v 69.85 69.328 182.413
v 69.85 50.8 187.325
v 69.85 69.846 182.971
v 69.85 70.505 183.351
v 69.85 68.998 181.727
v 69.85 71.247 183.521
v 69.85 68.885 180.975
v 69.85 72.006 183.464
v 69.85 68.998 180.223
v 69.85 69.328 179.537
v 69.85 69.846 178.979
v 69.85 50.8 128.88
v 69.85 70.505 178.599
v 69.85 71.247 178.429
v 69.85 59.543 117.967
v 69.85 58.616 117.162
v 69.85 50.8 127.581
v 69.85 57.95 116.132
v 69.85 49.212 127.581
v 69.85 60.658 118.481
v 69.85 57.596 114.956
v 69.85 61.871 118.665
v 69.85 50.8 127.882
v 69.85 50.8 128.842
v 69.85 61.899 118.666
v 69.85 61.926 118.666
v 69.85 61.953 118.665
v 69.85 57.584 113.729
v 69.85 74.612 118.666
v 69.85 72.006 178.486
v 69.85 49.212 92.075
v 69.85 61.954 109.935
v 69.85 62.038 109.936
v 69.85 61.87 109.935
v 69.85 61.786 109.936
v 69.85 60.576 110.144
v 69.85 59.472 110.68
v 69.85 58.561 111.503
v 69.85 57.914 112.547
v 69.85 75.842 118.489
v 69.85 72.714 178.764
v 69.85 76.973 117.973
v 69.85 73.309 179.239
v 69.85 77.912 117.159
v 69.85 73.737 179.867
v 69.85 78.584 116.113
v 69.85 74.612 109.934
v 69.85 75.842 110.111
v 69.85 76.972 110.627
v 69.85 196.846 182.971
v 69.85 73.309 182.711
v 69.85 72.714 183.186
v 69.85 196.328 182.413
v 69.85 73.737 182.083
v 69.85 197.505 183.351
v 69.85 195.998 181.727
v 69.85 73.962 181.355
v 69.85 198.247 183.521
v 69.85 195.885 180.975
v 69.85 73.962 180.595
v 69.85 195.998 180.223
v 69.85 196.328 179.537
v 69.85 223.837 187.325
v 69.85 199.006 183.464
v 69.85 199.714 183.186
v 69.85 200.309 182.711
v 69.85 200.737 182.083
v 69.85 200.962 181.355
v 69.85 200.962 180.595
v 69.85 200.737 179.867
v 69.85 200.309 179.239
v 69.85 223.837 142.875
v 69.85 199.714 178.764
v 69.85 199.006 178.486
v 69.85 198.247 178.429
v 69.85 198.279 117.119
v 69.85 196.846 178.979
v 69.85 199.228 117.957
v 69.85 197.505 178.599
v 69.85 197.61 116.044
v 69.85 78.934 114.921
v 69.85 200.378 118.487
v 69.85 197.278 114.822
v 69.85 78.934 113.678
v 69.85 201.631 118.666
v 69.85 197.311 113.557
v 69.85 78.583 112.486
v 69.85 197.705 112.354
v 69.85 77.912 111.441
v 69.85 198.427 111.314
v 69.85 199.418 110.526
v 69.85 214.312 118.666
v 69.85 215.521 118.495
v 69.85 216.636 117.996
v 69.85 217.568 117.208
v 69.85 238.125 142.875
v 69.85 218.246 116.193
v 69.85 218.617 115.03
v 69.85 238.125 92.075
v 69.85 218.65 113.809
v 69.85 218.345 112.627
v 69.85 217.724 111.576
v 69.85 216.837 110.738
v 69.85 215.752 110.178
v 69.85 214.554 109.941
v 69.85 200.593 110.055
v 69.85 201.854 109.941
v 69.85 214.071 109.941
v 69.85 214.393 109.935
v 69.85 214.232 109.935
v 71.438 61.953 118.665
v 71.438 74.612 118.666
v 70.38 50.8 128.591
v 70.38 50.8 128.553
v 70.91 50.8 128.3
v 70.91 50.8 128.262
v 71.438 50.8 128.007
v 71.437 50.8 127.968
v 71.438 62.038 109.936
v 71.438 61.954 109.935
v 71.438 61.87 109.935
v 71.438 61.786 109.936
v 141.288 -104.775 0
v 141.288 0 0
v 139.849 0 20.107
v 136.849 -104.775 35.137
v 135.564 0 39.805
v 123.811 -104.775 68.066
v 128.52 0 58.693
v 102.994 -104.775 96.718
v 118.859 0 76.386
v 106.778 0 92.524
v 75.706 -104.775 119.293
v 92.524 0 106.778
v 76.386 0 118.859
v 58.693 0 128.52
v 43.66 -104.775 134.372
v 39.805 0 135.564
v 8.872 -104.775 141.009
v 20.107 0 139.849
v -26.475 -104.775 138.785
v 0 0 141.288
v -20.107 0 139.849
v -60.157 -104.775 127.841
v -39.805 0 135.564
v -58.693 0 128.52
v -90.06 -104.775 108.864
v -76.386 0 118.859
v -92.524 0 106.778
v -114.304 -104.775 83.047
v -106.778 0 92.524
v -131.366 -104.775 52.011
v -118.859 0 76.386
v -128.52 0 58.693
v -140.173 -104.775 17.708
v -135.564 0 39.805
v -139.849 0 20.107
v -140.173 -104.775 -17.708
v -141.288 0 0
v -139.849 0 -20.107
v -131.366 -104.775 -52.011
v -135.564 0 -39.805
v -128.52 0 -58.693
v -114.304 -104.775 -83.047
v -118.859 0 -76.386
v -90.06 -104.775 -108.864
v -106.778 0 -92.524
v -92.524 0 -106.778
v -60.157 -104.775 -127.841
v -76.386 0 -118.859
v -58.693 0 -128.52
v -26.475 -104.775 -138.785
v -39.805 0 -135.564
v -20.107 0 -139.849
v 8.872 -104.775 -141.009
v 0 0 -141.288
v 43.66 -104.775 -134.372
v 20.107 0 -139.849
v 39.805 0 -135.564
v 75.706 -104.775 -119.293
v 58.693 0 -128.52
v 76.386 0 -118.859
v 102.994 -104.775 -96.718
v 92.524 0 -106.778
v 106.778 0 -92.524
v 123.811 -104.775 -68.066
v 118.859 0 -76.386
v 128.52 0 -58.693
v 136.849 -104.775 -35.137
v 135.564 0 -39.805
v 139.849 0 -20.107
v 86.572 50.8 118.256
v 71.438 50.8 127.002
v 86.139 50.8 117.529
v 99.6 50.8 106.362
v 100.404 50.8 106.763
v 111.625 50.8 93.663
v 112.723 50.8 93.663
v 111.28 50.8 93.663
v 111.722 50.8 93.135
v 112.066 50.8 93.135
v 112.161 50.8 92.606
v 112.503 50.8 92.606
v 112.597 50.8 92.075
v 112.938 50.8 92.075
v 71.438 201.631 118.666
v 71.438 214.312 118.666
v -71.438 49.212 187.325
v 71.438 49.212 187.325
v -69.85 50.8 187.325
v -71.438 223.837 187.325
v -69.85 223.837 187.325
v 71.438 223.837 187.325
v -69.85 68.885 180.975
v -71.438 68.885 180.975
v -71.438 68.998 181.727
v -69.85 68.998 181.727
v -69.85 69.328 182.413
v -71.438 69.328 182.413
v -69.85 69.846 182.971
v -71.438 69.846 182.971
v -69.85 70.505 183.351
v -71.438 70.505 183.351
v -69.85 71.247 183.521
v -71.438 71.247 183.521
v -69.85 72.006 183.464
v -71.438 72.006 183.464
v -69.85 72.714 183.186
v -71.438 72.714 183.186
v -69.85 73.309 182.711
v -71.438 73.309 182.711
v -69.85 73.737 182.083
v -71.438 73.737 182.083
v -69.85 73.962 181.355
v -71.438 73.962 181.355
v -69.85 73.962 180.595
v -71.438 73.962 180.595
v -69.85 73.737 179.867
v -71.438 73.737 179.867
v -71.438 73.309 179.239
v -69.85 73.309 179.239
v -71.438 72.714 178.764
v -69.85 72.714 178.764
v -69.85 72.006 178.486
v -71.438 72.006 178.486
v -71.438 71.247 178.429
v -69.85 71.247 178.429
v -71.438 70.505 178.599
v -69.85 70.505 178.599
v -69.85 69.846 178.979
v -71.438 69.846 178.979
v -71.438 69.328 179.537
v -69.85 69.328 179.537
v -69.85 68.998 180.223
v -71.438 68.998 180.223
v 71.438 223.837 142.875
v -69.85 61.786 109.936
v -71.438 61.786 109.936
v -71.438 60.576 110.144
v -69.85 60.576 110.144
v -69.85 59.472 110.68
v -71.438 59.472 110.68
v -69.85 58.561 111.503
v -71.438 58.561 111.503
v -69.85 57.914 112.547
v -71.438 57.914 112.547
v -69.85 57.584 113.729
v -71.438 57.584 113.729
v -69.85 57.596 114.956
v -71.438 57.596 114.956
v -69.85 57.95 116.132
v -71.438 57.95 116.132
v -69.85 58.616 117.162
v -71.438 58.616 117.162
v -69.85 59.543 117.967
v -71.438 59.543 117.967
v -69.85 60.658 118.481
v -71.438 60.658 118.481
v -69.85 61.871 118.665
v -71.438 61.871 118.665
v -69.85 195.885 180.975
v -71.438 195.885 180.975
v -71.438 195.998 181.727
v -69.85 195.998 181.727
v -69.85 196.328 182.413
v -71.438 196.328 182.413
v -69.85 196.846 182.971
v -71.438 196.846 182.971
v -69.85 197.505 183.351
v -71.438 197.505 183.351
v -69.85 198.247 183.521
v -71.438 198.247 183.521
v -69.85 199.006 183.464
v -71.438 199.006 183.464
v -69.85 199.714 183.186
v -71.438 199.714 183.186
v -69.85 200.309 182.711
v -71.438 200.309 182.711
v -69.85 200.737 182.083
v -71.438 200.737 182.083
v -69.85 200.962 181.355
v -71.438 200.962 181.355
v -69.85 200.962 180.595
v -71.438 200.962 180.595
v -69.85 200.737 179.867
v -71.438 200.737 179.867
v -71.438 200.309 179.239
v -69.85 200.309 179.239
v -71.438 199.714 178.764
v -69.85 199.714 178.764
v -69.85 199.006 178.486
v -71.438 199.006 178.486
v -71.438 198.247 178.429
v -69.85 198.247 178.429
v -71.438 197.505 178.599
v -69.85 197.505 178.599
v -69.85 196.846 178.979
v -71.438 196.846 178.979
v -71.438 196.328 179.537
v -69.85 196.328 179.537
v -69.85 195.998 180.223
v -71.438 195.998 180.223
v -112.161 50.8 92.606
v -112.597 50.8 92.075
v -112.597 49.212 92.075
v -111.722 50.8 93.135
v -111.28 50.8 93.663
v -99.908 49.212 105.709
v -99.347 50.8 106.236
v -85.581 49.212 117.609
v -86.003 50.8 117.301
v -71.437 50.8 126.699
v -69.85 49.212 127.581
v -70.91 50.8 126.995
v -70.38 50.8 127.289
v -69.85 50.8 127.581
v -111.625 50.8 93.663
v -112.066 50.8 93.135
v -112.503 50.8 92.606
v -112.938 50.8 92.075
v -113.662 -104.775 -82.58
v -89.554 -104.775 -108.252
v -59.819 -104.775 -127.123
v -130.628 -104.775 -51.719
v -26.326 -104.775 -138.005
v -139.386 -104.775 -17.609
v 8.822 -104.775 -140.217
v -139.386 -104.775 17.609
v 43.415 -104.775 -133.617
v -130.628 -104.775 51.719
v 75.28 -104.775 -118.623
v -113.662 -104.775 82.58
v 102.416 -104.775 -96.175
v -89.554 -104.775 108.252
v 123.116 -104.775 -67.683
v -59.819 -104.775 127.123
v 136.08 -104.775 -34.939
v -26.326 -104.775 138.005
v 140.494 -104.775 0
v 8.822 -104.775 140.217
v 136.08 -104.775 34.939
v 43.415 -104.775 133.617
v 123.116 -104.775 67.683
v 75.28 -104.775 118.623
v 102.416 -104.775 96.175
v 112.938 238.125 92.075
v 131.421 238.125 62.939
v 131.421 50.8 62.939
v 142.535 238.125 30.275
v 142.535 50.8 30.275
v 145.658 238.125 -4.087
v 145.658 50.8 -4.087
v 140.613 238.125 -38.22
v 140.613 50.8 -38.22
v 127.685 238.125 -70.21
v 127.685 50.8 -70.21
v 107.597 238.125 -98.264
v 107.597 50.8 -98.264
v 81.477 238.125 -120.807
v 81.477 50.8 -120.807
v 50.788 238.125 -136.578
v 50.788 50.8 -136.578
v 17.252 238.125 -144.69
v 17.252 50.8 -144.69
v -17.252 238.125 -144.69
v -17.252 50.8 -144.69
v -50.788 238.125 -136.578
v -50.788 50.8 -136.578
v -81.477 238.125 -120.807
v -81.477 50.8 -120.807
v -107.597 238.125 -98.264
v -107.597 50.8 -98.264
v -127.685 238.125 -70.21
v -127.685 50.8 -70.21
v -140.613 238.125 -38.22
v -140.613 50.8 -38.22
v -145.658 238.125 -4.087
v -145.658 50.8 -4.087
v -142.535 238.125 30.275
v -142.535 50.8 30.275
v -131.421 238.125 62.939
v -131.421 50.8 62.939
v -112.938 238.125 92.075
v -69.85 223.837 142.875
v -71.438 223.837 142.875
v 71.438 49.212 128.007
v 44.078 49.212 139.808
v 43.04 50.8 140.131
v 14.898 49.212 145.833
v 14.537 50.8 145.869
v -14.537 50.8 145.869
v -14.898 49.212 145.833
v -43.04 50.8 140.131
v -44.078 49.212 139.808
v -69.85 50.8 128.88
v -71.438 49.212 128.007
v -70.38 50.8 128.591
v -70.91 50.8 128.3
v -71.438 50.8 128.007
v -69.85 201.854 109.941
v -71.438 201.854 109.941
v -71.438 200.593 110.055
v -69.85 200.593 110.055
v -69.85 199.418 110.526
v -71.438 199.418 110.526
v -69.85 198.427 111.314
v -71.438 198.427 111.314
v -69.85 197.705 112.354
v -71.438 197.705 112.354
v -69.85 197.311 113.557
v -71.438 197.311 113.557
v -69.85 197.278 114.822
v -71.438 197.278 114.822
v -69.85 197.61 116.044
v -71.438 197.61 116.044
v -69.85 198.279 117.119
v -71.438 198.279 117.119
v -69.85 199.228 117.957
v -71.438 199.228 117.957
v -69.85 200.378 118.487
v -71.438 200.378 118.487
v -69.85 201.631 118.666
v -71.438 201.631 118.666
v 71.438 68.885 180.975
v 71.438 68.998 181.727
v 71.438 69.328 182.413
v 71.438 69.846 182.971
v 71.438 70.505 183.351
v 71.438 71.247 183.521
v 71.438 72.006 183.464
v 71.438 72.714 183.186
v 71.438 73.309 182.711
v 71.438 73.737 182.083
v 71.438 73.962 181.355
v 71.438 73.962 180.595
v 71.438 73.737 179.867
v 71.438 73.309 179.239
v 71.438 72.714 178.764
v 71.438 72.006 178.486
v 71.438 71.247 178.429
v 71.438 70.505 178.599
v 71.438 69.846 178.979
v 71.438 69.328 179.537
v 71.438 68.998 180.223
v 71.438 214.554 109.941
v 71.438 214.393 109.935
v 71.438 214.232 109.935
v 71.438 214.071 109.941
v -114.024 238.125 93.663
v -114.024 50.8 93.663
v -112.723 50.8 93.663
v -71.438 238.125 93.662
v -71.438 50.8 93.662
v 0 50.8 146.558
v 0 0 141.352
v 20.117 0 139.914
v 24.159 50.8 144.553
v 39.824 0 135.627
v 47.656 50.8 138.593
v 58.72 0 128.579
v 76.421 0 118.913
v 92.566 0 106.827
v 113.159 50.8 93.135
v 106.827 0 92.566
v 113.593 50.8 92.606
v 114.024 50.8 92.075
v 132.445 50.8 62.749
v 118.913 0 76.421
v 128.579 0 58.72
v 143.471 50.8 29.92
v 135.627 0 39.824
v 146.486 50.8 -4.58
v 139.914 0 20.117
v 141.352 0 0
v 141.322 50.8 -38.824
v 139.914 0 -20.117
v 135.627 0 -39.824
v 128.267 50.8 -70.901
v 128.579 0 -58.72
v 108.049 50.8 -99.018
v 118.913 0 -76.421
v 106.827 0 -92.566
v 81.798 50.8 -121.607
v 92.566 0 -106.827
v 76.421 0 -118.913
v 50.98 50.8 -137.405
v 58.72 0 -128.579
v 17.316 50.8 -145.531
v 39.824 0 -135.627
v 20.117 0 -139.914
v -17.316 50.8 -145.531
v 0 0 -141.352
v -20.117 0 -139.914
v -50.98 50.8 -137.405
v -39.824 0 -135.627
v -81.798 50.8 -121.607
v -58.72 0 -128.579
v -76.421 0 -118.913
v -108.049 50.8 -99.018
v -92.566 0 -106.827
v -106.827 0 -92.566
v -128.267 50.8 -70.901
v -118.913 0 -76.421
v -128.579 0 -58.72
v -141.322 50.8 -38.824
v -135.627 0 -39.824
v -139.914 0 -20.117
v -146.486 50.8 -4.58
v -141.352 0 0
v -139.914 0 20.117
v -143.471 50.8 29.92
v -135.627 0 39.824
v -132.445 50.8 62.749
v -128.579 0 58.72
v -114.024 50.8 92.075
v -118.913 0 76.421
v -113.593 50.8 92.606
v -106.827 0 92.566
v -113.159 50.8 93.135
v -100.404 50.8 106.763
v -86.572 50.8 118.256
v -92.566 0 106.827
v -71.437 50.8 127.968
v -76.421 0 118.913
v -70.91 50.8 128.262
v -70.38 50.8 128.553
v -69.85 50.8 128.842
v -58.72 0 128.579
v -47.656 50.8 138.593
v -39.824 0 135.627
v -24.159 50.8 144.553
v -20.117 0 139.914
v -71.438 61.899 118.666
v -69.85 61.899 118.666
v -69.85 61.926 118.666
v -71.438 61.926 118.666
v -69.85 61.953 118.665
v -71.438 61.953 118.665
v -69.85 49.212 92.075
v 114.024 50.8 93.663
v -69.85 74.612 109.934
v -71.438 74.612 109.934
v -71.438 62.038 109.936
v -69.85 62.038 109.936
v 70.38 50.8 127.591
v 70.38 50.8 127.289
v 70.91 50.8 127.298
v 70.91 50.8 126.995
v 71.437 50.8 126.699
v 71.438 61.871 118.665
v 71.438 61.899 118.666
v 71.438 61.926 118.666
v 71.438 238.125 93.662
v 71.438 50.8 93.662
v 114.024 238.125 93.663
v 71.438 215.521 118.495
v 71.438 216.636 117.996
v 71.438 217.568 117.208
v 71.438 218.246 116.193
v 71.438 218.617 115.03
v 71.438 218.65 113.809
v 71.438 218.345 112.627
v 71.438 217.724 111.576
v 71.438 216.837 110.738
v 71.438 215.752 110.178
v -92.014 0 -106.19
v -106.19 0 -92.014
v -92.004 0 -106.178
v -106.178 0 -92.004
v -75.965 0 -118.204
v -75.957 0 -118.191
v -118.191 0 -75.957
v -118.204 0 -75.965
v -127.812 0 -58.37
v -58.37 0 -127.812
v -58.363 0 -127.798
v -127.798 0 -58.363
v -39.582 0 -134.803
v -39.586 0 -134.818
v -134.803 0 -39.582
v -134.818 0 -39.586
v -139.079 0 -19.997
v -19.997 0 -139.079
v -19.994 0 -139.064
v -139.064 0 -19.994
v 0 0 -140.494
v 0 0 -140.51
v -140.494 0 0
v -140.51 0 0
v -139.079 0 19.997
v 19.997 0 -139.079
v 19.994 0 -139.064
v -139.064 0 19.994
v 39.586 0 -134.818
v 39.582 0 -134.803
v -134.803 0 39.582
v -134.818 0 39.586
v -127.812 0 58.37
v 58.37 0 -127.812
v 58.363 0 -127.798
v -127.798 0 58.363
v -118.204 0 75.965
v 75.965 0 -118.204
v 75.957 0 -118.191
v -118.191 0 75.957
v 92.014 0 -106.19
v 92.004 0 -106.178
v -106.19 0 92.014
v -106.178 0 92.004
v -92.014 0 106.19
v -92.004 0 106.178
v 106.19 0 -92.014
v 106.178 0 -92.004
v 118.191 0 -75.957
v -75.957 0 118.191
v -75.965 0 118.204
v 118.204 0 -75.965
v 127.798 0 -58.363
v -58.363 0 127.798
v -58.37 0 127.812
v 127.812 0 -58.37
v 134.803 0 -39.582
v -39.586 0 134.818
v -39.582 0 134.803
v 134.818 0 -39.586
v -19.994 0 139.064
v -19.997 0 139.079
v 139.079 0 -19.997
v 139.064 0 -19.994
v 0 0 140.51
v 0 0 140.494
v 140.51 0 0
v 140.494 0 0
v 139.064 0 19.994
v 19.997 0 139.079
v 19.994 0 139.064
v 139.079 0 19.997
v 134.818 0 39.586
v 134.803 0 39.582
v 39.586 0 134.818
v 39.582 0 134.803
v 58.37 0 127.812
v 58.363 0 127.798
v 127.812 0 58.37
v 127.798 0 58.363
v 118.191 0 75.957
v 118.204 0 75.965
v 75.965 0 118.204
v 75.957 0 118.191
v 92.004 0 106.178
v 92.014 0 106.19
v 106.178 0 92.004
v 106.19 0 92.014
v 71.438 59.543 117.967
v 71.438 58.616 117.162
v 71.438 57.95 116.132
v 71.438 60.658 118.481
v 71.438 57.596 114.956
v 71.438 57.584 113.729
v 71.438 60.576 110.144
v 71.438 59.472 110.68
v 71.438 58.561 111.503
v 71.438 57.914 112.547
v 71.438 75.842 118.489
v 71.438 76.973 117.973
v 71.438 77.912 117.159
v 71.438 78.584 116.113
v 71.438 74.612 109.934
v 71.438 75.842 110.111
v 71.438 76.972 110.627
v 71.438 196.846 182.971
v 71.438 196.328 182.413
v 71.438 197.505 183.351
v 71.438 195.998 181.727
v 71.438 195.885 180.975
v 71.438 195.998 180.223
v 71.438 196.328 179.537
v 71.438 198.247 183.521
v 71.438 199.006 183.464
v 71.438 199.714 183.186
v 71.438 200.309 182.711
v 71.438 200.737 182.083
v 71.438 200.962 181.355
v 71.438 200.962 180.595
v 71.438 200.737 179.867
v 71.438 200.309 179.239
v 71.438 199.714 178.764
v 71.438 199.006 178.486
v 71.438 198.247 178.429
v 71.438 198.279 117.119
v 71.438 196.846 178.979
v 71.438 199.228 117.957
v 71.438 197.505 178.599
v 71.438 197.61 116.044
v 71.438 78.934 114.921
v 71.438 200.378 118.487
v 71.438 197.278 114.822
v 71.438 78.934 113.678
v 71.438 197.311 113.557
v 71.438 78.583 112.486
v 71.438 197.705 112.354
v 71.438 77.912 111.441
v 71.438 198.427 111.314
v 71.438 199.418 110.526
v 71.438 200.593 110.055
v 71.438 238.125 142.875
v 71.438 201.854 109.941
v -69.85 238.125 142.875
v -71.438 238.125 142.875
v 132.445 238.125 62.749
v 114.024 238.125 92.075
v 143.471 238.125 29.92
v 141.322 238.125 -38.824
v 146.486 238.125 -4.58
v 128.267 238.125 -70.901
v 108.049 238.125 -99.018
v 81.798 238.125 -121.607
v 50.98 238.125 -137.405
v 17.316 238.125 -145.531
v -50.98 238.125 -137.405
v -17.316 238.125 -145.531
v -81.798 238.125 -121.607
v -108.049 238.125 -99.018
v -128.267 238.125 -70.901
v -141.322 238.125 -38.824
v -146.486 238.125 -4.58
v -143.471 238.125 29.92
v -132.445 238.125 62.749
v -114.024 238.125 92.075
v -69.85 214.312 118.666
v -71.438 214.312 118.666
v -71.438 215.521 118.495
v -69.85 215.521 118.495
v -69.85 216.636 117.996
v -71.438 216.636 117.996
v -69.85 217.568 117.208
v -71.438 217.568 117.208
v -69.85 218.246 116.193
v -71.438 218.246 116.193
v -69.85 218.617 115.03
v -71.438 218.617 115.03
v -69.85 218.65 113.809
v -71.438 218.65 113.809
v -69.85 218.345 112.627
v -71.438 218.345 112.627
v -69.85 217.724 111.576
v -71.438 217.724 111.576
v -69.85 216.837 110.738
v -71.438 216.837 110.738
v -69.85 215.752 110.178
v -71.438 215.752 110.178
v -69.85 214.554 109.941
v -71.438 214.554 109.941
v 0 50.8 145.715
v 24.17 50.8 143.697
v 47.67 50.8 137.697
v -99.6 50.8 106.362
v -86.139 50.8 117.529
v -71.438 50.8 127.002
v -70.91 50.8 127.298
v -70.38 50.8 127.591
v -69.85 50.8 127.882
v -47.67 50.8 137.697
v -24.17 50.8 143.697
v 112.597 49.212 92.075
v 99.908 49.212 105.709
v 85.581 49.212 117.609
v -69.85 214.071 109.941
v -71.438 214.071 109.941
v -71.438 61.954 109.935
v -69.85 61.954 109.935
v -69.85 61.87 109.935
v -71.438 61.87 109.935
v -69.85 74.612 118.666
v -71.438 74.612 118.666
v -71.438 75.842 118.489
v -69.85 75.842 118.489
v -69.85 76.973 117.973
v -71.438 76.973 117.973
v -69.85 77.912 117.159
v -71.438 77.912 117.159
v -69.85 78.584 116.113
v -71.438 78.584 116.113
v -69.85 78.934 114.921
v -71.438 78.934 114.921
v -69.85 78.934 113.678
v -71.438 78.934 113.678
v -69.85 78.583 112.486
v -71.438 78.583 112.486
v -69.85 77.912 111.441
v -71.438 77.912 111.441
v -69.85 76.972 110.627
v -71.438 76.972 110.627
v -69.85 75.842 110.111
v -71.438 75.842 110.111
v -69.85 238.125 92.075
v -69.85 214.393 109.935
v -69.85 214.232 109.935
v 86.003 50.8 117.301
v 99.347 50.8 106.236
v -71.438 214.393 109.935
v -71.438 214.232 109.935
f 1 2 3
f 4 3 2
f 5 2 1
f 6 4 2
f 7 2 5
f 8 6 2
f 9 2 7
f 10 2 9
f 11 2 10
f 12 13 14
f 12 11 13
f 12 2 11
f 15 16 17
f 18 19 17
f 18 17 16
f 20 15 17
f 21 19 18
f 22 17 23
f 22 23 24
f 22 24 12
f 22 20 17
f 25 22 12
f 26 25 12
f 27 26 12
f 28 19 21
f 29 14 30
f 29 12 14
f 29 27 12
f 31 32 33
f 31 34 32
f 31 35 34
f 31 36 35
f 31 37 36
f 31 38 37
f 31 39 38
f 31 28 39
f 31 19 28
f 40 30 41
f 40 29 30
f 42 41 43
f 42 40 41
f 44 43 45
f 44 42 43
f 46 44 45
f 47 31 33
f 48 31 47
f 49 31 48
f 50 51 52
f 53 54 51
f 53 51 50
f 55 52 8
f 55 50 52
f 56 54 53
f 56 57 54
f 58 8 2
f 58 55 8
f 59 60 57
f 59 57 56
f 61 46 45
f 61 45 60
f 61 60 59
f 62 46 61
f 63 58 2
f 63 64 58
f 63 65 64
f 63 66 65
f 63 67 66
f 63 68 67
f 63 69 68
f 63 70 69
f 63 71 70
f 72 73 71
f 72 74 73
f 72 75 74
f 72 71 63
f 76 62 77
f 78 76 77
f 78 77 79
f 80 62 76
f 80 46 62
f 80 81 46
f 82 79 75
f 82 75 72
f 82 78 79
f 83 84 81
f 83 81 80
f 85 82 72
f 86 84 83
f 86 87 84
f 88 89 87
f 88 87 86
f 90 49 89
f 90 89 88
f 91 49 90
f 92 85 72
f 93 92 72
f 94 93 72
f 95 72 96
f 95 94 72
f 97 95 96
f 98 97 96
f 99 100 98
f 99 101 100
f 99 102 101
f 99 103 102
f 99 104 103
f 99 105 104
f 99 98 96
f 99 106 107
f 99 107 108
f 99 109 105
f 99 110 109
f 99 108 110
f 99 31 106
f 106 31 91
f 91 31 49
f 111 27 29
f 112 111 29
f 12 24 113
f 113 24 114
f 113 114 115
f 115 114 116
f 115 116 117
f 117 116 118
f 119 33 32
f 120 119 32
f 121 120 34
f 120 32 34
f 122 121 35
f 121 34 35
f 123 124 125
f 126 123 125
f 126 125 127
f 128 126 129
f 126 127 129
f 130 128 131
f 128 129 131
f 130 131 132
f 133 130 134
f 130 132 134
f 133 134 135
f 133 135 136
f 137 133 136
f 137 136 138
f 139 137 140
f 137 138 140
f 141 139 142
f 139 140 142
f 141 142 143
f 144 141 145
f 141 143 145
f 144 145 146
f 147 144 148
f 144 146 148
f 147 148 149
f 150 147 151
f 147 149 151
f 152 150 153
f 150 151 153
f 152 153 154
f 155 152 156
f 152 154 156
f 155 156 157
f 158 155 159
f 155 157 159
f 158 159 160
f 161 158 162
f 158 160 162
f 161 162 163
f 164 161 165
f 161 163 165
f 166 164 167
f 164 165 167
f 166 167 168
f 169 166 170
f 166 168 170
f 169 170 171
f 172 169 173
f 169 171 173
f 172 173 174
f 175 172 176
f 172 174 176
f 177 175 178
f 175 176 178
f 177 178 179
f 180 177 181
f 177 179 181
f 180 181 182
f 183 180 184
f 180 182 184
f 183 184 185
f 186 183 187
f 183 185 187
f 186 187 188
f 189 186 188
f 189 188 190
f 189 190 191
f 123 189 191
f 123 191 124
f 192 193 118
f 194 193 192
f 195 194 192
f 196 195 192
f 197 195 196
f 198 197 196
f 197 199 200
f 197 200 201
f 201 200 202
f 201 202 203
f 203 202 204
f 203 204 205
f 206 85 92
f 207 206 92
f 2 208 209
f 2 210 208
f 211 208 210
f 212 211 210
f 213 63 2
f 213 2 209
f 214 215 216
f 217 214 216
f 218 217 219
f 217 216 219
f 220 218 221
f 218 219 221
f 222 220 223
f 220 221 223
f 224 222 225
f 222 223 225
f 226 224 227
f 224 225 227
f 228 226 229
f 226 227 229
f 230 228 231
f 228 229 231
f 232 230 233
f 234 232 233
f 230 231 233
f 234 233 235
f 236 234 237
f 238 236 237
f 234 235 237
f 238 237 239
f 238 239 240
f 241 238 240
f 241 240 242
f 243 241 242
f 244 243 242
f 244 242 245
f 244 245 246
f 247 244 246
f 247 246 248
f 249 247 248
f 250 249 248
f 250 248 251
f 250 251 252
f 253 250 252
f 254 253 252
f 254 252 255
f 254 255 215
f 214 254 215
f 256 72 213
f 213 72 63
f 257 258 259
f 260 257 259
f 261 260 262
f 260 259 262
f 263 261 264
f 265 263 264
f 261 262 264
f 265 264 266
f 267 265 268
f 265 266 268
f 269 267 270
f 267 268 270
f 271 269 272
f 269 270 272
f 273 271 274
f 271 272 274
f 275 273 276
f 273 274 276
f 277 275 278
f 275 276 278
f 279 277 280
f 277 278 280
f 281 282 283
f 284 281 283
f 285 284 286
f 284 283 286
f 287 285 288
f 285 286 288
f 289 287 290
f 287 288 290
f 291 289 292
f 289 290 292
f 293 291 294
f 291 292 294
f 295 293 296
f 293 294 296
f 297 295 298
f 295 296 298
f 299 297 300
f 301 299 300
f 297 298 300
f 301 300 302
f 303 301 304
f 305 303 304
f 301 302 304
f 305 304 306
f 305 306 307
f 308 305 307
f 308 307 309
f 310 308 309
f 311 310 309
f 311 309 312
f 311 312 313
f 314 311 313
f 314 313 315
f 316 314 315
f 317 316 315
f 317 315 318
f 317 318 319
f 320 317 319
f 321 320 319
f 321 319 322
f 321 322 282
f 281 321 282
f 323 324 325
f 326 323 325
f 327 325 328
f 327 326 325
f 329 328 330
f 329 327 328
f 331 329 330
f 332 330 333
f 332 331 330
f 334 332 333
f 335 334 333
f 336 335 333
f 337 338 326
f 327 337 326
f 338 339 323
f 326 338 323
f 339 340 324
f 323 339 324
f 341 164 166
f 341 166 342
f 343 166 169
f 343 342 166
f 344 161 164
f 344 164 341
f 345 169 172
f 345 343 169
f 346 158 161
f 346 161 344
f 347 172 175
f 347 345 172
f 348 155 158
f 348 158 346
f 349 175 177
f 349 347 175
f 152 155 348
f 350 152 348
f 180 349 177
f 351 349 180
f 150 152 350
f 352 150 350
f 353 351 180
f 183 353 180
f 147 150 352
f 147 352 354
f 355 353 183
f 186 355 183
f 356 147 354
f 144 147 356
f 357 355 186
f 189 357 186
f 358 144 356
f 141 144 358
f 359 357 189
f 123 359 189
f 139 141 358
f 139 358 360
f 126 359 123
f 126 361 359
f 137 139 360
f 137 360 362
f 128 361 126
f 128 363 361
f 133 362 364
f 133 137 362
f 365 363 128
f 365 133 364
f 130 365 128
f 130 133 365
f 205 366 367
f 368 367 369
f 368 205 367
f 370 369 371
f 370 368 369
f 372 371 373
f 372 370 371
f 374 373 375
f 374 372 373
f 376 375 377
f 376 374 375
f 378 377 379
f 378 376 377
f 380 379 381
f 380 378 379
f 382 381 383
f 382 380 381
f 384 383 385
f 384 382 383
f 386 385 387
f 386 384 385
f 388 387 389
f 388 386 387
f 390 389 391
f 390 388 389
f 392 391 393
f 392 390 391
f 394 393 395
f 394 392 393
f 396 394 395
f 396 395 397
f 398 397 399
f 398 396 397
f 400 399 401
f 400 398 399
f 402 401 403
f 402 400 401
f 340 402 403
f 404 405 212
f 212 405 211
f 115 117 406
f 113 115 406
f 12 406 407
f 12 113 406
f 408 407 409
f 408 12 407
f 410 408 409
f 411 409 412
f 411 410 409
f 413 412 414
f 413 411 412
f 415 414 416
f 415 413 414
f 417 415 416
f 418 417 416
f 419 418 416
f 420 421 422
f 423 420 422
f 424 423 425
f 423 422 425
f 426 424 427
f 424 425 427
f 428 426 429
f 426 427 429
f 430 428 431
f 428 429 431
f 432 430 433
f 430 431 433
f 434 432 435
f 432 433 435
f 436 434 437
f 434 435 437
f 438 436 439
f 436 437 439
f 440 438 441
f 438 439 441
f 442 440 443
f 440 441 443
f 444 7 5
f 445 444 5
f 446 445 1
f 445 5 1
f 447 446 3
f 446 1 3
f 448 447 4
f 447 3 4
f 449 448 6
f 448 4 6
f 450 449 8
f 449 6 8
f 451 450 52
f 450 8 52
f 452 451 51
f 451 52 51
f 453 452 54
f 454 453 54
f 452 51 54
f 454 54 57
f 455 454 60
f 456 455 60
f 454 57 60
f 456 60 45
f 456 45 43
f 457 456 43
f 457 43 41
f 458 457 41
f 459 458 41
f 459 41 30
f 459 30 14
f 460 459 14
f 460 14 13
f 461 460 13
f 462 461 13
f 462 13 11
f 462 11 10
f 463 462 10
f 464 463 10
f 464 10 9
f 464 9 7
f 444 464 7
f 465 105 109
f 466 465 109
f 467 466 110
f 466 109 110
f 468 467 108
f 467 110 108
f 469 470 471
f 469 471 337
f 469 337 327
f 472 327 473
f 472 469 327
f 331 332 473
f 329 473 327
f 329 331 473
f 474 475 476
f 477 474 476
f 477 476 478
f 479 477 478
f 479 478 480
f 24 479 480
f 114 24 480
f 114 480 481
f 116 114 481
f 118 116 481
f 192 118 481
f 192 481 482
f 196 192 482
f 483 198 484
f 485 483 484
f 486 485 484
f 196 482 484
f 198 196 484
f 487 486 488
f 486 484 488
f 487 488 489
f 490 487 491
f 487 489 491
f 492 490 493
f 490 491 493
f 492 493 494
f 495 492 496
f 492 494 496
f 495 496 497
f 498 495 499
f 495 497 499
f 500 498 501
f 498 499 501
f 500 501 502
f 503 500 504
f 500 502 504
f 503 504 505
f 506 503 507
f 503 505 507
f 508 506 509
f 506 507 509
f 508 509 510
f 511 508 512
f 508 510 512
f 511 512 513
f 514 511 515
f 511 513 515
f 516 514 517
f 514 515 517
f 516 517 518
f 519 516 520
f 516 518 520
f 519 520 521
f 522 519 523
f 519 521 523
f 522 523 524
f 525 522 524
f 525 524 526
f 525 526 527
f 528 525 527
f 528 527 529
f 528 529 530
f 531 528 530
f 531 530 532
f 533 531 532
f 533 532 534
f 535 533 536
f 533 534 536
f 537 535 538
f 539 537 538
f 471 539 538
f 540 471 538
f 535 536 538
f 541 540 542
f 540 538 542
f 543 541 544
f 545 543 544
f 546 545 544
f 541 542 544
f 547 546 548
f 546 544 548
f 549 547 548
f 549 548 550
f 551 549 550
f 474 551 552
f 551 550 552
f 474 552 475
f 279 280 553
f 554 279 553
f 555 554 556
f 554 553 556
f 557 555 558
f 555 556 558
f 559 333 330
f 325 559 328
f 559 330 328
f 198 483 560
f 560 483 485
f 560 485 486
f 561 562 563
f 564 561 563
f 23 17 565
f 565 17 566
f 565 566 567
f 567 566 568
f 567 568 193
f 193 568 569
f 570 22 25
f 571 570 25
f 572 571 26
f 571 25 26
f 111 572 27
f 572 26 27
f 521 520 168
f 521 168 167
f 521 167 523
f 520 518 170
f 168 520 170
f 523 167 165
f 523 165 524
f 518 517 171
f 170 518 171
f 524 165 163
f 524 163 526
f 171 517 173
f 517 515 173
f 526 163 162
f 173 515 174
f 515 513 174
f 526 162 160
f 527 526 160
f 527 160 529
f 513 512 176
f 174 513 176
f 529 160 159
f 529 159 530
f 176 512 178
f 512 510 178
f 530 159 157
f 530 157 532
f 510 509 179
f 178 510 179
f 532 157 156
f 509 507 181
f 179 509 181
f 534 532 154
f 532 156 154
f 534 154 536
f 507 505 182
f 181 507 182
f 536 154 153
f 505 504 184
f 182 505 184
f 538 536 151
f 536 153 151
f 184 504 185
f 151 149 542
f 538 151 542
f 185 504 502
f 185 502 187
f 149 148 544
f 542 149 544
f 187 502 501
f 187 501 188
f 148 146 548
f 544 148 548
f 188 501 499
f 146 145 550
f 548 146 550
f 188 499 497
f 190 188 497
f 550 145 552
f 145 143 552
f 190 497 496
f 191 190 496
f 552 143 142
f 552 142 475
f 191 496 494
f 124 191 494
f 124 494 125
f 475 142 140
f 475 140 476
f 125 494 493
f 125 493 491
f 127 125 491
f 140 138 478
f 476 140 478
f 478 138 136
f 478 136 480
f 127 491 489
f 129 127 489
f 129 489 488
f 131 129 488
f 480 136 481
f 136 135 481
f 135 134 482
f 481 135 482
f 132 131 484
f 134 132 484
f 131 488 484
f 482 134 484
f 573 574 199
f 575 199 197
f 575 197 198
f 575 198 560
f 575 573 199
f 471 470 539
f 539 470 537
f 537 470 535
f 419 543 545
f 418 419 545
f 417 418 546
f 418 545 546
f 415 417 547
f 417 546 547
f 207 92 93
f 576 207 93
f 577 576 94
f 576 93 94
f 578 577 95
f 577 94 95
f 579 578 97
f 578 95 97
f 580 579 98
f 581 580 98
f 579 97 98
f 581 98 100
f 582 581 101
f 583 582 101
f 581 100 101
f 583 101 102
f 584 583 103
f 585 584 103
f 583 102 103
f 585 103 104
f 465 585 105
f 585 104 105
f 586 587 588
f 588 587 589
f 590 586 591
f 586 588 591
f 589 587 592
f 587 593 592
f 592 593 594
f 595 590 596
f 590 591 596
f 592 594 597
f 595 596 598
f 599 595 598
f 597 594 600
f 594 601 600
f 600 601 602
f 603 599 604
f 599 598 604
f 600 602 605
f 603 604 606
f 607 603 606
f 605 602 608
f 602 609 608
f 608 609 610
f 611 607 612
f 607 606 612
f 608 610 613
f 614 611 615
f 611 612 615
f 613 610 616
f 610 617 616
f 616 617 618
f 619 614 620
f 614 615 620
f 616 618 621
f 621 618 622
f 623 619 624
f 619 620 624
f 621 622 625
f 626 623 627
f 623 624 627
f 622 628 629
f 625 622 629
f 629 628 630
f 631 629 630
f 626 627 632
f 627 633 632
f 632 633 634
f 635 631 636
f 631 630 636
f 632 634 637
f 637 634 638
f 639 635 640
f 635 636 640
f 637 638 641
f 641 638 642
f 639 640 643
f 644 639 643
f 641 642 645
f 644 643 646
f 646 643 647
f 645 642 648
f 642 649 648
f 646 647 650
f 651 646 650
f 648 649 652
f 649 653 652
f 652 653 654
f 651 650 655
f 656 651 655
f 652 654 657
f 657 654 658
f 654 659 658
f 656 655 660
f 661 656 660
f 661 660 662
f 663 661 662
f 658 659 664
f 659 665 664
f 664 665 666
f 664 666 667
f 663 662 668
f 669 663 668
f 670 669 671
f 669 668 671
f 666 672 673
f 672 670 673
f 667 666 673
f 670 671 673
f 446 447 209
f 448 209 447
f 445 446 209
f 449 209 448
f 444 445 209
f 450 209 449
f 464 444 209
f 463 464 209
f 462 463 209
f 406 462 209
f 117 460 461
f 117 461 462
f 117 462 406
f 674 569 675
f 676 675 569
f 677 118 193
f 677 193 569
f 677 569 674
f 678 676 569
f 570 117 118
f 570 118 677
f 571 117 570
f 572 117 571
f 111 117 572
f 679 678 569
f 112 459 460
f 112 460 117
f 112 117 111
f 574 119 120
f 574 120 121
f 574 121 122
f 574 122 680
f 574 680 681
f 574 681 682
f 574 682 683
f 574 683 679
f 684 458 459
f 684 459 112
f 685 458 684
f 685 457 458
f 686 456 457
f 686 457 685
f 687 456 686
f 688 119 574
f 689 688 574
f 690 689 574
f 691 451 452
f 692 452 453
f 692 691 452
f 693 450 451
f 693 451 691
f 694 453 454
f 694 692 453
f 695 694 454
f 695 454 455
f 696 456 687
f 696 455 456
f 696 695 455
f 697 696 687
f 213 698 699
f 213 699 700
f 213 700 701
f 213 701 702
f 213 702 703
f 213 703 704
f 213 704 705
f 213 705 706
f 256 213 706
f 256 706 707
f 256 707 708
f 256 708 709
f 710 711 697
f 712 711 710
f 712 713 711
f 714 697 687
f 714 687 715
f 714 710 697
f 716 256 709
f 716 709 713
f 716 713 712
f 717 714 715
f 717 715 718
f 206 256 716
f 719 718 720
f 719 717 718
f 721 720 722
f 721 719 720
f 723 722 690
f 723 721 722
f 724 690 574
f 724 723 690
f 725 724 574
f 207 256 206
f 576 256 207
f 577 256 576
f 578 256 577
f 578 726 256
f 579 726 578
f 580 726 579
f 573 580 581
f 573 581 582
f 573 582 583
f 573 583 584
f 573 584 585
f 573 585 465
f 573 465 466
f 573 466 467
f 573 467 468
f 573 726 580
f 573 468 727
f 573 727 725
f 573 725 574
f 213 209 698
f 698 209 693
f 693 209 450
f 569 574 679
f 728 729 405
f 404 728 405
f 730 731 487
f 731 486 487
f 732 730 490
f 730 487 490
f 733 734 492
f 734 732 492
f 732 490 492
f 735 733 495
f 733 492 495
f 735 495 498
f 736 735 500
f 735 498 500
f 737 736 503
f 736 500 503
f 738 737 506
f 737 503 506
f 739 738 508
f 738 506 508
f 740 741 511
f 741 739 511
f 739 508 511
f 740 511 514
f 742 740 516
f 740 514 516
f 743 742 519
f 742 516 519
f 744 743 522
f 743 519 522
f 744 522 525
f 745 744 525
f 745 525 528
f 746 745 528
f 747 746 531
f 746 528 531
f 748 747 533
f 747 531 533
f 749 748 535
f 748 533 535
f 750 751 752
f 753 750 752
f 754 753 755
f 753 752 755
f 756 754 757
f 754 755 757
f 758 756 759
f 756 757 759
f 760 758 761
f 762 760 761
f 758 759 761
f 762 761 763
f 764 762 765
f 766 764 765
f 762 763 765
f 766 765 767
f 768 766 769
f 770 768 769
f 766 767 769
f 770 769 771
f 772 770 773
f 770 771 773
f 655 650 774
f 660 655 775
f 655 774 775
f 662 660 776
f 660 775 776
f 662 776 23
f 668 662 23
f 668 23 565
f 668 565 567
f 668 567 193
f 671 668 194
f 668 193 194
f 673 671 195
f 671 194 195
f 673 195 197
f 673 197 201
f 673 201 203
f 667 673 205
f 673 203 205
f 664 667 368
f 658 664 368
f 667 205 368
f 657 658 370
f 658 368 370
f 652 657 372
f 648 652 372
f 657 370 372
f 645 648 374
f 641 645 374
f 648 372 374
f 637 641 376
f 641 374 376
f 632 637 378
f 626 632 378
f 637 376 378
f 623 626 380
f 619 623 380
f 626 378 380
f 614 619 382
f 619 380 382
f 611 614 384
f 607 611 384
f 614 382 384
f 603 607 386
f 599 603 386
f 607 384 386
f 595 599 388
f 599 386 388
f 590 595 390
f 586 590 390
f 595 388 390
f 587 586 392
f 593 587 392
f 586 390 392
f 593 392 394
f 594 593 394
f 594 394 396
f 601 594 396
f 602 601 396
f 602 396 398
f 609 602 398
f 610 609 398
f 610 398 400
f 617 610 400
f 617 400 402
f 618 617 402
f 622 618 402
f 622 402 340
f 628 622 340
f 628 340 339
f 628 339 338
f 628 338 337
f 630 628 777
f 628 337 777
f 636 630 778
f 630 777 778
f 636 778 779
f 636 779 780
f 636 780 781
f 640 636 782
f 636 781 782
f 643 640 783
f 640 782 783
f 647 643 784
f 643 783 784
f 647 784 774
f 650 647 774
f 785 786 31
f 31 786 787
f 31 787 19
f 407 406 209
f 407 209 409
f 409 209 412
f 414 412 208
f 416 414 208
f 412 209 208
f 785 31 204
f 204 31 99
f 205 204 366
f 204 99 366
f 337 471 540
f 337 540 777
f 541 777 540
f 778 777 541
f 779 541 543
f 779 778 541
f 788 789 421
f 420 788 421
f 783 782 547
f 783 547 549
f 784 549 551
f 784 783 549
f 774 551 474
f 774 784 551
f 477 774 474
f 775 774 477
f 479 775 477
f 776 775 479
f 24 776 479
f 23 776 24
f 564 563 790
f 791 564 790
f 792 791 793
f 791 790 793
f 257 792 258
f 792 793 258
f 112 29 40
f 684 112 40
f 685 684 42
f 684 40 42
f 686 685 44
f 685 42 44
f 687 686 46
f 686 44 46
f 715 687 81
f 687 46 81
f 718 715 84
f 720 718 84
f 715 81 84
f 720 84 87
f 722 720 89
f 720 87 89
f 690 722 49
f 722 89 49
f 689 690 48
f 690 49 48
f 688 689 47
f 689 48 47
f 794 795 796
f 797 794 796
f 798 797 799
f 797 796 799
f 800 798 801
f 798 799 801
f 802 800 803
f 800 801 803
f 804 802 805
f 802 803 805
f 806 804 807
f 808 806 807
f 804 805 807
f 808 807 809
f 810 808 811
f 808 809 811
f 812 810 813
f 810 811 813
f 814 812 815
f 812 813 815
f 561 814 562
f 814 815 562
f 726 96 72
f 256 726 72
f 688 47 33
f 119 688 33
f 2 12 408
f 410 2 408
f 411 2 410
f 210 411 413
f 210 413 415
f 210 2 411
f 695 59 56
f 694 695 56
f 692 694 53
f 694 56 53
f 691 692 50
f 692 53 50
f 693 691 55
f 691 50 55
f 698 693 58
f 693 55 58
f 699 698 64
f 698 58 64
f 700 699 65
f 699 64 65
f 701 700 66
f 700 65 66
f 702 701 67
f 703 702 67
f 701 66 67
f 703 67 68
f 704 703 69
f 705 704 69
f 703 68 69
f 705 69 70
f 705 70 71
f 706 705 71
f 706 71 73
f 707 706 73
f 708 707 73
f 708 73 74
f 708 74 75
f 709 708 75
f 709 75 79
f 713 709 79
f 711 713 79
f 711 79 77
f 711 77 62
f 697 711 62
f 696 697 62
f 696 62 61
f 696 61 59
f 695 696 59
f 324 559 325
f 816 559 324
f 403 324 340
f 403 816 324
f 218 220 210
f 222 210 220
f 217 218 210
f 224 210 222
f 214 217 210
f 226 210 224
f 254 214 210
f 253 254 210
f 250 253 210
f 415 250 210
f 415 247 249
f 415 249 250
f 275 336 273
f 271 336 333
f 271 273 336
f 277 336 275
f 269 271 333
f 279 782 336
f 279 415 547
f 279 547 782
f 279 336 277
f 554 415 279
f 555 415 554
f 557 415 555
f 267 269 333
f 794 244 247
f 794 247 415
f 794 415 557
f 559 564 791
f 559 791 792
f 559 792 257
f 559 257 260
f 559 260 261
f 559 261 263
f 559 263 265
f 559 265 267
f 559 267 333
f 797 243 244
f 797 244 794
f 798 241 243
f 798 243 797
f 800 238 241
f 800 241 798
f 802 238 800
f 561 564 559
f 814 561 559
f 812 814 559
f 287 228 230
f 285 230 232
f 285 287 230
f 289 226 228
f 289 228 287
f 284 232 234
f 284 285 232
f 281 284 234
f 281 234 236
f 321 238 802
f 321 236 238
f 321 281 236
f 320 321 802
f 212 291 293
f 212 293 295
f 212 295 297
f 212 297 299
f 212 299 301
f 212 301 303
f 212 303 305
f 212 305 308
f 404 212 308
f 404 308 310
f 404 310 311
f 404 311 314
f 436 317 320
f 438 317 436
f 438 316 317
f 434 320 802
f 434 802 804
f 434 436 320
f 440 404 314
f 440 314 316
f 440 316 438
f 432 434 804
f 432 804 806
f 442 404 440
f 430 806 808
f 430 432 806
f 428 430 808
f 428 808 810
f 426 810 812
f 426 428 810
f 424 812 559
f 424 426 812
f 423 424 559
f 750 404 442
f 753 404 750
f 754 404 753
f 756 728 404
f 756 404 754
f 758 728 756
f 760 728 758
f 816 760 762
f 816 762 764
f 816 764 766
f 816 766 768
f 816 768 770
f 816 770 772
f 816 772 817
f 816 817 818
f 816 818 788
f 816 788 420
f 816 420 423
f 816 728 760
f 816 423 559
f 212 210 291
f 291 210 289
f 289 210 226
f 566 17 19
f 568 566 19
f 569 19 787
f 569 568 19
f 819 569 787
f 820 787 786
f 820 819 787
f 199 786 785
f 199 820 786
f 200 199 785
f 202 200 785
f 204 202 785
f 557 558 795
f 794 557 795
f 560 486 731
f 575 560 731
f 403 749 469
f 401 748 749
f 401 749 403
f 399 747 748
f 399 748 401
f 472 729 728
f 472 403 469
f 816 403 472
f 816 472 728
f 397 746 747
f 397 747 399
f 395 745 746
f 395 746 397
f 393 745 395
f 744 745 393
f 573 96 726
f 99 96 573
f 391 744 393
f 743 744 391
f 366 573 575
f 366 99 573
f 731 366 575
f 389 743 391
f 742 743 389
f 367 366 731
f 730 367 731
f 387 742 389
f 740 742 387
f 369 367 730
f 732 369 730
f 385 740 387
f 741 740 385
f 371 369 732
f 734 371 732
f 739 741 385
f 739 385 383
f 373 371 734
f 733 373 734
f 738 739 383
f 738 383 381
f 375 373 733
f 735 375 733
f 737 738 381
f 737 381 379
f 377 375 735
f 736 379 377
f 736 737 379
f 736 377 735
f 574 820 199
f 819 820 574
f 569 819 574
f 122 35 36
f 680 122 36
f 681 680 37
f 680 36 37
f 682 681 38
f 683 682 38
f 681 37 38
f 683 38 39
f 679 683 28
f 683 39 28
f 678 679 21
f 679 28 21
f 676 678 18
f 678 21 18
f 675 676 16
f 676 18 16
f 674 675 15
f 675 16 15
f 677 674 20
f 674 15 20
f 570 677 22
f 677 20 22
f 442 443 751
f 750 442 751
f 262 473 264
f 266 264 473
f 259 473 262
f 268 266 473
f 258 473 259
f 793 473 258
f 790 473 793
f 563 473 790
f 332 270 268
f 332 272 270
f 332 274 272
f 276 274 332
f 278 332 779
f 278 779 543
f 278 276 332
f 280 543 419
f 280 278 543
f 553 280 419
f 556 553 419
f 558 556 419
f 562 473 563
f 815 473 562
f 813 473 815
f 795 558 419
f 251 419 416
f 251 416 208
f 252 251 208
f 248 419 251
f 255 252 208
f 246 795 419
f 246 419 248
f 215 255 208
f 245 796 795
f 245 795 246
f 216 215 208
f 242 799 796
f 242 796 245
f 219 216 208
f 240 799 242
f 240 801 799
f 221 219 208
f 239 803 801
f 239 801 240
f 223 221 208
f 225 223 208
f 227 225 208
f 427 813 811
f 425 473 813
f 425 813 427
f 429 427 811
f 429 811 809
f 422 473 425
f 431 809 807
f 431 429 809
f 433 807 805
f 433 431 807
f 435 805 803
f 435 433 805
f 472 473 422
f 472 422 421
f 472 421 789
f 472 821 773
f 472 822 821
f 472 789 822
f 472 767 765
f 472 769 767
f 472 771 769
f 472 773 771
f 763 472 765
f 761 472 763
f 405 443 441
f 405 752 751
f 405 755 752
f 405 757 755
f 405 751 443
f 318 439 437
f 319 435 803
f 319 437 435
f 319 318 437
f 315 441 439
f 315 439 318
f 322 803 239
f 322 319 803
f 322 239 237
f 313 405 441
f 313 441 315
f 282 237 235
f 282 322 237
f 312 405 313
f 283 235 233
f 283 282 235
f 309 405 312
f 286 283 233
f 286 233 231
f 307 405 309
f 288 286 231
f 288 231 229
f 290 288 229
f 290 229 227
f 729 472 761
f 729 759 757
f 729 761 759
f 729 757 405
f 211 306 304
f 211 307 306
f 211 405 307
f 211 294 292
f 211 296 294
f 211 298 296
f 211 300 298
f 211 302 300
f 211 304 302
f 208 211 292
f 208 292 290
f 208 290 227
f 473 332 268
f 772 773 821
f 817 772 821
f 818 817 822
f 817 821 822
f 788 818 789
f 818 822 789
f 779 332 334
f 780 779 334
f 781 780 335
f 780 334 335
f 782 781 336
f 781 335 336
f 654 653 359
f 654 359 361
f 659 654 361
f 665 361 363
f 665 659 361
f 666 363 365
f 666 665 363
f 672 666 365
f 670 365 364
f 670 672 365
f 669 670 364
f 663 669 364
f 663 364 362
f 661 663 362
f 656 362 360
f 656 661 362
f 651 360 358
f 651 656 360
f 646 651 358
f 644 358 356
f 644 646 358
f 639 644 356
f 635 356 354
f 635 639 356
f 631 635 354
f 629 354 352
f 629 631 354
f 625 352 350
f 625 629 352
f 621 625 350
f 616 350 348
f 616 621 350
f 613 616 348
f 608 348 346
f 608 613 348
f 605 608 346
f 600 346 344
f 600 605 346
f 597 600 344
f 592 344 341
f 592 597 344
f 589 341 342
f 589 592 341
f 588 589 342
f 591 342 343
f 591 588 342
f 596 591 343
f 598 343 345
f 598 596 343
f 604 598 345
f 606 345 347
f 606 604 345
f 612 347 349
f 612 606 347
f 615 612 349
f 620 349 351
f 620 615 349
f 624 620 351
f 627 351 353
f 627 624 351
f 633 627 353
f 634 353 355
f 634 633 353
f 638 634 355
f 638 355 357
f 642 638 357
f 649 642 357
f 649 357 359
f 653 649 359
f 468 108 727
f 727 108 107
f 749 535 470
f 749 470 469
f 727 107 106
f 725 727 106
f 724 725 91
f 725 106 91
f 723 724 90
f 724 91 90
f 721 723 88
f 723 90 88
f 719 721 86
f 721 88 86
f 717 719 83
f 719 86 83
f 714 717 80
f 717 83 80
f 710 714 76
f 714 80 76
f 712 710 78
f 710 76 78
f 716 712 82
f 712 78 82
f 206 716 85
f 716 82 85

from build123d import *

# Parameters (mm, degrees)
F0_R      = 141.2875
F0_R_2    = 140.49375
F1_DEPTH  = 104.775
F6_R      = 146.558
F6_R_2    = 145.7151605206
F7_DEPTH  = 187.325
F8_W      = 355.6
F8_H      = 187.325
F9_DEPTH  = 54.484
F10_W     = 44.1738647784
F10_H     = 187.325
F11_DEPTH = 1.5875
F12_W     = 1.5875
F12_H     = 187.325
F13_DEPTH = 93.6625
F15_DEPTH = 1.5875
F17_DEPTH = 1.5875
F18_W     = 14.2875
F18_H     = 44.45
F19_DEPTH = 217.9965
F20_R     = 2.5527
F21_DEPTH = 217.9965


with BuildPart() as f1:
    # F0 (on Front) → F1 (new body)
    with BuildSketch(Plane.XZ):
        Circle(F0_R)
        Circle(F0_R_2, mode=Mode.SUBTRACT)
    extrude(amount=F1_DEPTH)

    # F3 (on Right) → F4 (revolve)
    with BuildSketch(Plane.YZ):
        Polygon((0, 141.3524150848), (0, 140.5095756054), (50.8, 145.7151605206), (50.8, 146.558), align=None)
    revolve(axis=Axis((0, 43.5656532645, 0), (0, 1, 0)))

    # F6 (on face) → F7 (join)
    with BuildSketch(Plane(origin=(0, 50.8, 0), x_dir=(-1, 0, 0), z_dir=(0, 1, 0))):
        Circle(F6_R)
        Circle(F6_R_2, mode=Mode.SUBTRACT)
    extrude(amount=F7_DEPTH)

    # F8 (on offset) → F9 (cut, through all)
    with BuildSketch(Plane.XY.offset(92.075)):
        with Locations((0, 144.4625)):
            Rectangle(F8_W, F8_H)
    extrude(amount=F9_DEPTH, mode=Mode.SUBTRACT)

    # F10 (on offset) → F11 (join)
    with BuildSketch(Plane.XY.offset(92.075)):
        with Locations((91.9369323892, 144.4625)):
            Rectangle(F10_W, F10_H)
        with Locations((-91.9369323892, 144.4625)):
            Rectangle(F10_W, F10_H)
    extrude(amount=F11_DEPTH)

    # F12 (on face) → F13 (join)
    with BuildSketch(Plane.XY.offset(93.6625)):
        with Locations((70.64375, 144.4625)):
            Rectangle(F12_W, F12_H)
        with Locations((-70.64375, 144.4625)):
            Rectangle(F12_W, F12_H)
    extrude(amount=F13_DEPTH)

    # F14 (on face) → F15 (join)
    with BuildSketch(Plane(origin=(0, 50.8, 0), x_dir=(-1, 0, 0), z_dir=(0, 1, 0))):
        with BuildLine():
            Line((69.85, 92.075), (112.5973956514, 92.075))
            ThreePointArc((112.5973956514, 92.075), (92.9351127931, 111.8885335618), (69.85, 127.5811766385))
            Line((69.85, 127.5811766385), (69.85, 92.075))
        make_face()
        with BuildLine():
            ThreePointArc((-69.85, 127.5811766385), (-92.9351127931, 111.8885335618), (-112.5973956514, 92.075))
            Line((-112.5973956514, 92.075), (-69.85, 92.075))
            Line((-69.85, 92.075), (-69.85, 127.5811766385))
        make_face()
    extrude(amount=-F15_DEPTH)

    # F16 (on face) → F17 (join)
    with BuildSketch(Plane(origin=(0, 50.8, 0), x_dir=(-1, 0, 0), z_dir=(0, 1, 0))):
        with BuildLine():
            ThreePointArc((-71.4375, 128.0071860315), (0, 146.5918008687), (71.4375, 128.0071860315))
            Line((71.4375, 128.0071860315), (71.4375, 187.325))
            Line((71.4375, 187.325), (-71.4375, 187.325))
            Line((-71.4375, 187.325), (-71.4375, 128.0071860315))
        make_face()
    extrude(amount=-F17_DEPTH)

    # F18 (on face) → F19 (cut, through all)
    with BuildSketch(Plane(origin=(-71.4375, 0, 0), x_dir=(0, -1, 0), z_dir=(-1, 0, 0))):
        with Locations((-230.98125, 165.1)):
            Rectangle(F18_W, F18_H)
    extrude(amount=-F19_DEPTH, mode=Mode.SUBTRACT)

    # F20 (on face) → F21 (cut, through all)
    with BuildSketch(Plane(origin=(-71.4375, 0, 0), x_dir=(0, -1, 0), z_dir=(-1, 0, 0))):
        with BuildLine():
            Line((-61.7855314592, 109.9362217483), (-62.0382119647, 109.936185368))
            ThreePointArc((-62.0382119647, 109.936185368), (-61.9118714487, 109.9343750452), (-61.7855314592, 109.9362217483))
        make_face()
        with BuildLine():
            Line((-74.6118714487, 109.9343750452), (-62.0382119647, 109.936185368))
            Line((-62.0382119647, 109.936185368), (-61.7855314592, 109.9362217483))
            ThreePointArc((-61.7855314592, 109.9362217483), (-57.5470865675, 114.3429791138), (-61.8714737728, 118.6654322225))
            Line((-61.8714737728, 118.6654322225), (-61.9533941249, 118.665433462))
            Line((-61.9533941249, 118.665433462), (-74.6124339459, 118.6656249995))
            ThreePointArc((-74.6124339459, 118.6656249995), (-78.9781249909, 114.2997187514), (-74.6118714487, 109.9343750452))
        make_face()
        with BuildLine():
            Line((-61.9533941249, 118.665433462), (-61.8714737728, 118.6654322225))
            ThreePointArc((-61.8714737728, 118.6654322225), (-61.9124339459, 118.6656249995), (-61.9533941249, 118.665433462))
        make_face()
        with BuildLine():
            Line((-214.0709987284, 109.9410599022), (-201.8540012716, 109.9410599022))
            ThreePointArc((-201.8540012716, 109.9410599022), (-197.2482995581, 114.188482543), (-201.6310653813, 118.665585524))
            Line((-201.6310653813, 118.665585524), (-214.3124864102, 118.665625))
            ThreePointArc((-214.3124864102, 118.665625), (-218.6764532664, 114.4208036798), (-214.5540012716, 109.9410599022))
            Line((-214.5540012716, 109.9410599022), (-214.0709987284, 109.9410599022))
        make_face()
        with BuildLine():
            ThreePointArc((-214.5540012716, 109.9410599022), (-214.3125, 109.934375), (-214.0709987284, 109.9410599022))
            Line((-214.0709987284, 109.9410599022), (-214.5540012716, 109.9410599022))
        make_face()
        with Locations((-71.4375, 180.975)):
            Circle(F20_R)
        with Locations((-198.4375, 180.975)):
            Circle(F20_R)
    extrude(amount=-F21_DEPTH, mode=Mode.SUBTRACT)


solid = f1.part
